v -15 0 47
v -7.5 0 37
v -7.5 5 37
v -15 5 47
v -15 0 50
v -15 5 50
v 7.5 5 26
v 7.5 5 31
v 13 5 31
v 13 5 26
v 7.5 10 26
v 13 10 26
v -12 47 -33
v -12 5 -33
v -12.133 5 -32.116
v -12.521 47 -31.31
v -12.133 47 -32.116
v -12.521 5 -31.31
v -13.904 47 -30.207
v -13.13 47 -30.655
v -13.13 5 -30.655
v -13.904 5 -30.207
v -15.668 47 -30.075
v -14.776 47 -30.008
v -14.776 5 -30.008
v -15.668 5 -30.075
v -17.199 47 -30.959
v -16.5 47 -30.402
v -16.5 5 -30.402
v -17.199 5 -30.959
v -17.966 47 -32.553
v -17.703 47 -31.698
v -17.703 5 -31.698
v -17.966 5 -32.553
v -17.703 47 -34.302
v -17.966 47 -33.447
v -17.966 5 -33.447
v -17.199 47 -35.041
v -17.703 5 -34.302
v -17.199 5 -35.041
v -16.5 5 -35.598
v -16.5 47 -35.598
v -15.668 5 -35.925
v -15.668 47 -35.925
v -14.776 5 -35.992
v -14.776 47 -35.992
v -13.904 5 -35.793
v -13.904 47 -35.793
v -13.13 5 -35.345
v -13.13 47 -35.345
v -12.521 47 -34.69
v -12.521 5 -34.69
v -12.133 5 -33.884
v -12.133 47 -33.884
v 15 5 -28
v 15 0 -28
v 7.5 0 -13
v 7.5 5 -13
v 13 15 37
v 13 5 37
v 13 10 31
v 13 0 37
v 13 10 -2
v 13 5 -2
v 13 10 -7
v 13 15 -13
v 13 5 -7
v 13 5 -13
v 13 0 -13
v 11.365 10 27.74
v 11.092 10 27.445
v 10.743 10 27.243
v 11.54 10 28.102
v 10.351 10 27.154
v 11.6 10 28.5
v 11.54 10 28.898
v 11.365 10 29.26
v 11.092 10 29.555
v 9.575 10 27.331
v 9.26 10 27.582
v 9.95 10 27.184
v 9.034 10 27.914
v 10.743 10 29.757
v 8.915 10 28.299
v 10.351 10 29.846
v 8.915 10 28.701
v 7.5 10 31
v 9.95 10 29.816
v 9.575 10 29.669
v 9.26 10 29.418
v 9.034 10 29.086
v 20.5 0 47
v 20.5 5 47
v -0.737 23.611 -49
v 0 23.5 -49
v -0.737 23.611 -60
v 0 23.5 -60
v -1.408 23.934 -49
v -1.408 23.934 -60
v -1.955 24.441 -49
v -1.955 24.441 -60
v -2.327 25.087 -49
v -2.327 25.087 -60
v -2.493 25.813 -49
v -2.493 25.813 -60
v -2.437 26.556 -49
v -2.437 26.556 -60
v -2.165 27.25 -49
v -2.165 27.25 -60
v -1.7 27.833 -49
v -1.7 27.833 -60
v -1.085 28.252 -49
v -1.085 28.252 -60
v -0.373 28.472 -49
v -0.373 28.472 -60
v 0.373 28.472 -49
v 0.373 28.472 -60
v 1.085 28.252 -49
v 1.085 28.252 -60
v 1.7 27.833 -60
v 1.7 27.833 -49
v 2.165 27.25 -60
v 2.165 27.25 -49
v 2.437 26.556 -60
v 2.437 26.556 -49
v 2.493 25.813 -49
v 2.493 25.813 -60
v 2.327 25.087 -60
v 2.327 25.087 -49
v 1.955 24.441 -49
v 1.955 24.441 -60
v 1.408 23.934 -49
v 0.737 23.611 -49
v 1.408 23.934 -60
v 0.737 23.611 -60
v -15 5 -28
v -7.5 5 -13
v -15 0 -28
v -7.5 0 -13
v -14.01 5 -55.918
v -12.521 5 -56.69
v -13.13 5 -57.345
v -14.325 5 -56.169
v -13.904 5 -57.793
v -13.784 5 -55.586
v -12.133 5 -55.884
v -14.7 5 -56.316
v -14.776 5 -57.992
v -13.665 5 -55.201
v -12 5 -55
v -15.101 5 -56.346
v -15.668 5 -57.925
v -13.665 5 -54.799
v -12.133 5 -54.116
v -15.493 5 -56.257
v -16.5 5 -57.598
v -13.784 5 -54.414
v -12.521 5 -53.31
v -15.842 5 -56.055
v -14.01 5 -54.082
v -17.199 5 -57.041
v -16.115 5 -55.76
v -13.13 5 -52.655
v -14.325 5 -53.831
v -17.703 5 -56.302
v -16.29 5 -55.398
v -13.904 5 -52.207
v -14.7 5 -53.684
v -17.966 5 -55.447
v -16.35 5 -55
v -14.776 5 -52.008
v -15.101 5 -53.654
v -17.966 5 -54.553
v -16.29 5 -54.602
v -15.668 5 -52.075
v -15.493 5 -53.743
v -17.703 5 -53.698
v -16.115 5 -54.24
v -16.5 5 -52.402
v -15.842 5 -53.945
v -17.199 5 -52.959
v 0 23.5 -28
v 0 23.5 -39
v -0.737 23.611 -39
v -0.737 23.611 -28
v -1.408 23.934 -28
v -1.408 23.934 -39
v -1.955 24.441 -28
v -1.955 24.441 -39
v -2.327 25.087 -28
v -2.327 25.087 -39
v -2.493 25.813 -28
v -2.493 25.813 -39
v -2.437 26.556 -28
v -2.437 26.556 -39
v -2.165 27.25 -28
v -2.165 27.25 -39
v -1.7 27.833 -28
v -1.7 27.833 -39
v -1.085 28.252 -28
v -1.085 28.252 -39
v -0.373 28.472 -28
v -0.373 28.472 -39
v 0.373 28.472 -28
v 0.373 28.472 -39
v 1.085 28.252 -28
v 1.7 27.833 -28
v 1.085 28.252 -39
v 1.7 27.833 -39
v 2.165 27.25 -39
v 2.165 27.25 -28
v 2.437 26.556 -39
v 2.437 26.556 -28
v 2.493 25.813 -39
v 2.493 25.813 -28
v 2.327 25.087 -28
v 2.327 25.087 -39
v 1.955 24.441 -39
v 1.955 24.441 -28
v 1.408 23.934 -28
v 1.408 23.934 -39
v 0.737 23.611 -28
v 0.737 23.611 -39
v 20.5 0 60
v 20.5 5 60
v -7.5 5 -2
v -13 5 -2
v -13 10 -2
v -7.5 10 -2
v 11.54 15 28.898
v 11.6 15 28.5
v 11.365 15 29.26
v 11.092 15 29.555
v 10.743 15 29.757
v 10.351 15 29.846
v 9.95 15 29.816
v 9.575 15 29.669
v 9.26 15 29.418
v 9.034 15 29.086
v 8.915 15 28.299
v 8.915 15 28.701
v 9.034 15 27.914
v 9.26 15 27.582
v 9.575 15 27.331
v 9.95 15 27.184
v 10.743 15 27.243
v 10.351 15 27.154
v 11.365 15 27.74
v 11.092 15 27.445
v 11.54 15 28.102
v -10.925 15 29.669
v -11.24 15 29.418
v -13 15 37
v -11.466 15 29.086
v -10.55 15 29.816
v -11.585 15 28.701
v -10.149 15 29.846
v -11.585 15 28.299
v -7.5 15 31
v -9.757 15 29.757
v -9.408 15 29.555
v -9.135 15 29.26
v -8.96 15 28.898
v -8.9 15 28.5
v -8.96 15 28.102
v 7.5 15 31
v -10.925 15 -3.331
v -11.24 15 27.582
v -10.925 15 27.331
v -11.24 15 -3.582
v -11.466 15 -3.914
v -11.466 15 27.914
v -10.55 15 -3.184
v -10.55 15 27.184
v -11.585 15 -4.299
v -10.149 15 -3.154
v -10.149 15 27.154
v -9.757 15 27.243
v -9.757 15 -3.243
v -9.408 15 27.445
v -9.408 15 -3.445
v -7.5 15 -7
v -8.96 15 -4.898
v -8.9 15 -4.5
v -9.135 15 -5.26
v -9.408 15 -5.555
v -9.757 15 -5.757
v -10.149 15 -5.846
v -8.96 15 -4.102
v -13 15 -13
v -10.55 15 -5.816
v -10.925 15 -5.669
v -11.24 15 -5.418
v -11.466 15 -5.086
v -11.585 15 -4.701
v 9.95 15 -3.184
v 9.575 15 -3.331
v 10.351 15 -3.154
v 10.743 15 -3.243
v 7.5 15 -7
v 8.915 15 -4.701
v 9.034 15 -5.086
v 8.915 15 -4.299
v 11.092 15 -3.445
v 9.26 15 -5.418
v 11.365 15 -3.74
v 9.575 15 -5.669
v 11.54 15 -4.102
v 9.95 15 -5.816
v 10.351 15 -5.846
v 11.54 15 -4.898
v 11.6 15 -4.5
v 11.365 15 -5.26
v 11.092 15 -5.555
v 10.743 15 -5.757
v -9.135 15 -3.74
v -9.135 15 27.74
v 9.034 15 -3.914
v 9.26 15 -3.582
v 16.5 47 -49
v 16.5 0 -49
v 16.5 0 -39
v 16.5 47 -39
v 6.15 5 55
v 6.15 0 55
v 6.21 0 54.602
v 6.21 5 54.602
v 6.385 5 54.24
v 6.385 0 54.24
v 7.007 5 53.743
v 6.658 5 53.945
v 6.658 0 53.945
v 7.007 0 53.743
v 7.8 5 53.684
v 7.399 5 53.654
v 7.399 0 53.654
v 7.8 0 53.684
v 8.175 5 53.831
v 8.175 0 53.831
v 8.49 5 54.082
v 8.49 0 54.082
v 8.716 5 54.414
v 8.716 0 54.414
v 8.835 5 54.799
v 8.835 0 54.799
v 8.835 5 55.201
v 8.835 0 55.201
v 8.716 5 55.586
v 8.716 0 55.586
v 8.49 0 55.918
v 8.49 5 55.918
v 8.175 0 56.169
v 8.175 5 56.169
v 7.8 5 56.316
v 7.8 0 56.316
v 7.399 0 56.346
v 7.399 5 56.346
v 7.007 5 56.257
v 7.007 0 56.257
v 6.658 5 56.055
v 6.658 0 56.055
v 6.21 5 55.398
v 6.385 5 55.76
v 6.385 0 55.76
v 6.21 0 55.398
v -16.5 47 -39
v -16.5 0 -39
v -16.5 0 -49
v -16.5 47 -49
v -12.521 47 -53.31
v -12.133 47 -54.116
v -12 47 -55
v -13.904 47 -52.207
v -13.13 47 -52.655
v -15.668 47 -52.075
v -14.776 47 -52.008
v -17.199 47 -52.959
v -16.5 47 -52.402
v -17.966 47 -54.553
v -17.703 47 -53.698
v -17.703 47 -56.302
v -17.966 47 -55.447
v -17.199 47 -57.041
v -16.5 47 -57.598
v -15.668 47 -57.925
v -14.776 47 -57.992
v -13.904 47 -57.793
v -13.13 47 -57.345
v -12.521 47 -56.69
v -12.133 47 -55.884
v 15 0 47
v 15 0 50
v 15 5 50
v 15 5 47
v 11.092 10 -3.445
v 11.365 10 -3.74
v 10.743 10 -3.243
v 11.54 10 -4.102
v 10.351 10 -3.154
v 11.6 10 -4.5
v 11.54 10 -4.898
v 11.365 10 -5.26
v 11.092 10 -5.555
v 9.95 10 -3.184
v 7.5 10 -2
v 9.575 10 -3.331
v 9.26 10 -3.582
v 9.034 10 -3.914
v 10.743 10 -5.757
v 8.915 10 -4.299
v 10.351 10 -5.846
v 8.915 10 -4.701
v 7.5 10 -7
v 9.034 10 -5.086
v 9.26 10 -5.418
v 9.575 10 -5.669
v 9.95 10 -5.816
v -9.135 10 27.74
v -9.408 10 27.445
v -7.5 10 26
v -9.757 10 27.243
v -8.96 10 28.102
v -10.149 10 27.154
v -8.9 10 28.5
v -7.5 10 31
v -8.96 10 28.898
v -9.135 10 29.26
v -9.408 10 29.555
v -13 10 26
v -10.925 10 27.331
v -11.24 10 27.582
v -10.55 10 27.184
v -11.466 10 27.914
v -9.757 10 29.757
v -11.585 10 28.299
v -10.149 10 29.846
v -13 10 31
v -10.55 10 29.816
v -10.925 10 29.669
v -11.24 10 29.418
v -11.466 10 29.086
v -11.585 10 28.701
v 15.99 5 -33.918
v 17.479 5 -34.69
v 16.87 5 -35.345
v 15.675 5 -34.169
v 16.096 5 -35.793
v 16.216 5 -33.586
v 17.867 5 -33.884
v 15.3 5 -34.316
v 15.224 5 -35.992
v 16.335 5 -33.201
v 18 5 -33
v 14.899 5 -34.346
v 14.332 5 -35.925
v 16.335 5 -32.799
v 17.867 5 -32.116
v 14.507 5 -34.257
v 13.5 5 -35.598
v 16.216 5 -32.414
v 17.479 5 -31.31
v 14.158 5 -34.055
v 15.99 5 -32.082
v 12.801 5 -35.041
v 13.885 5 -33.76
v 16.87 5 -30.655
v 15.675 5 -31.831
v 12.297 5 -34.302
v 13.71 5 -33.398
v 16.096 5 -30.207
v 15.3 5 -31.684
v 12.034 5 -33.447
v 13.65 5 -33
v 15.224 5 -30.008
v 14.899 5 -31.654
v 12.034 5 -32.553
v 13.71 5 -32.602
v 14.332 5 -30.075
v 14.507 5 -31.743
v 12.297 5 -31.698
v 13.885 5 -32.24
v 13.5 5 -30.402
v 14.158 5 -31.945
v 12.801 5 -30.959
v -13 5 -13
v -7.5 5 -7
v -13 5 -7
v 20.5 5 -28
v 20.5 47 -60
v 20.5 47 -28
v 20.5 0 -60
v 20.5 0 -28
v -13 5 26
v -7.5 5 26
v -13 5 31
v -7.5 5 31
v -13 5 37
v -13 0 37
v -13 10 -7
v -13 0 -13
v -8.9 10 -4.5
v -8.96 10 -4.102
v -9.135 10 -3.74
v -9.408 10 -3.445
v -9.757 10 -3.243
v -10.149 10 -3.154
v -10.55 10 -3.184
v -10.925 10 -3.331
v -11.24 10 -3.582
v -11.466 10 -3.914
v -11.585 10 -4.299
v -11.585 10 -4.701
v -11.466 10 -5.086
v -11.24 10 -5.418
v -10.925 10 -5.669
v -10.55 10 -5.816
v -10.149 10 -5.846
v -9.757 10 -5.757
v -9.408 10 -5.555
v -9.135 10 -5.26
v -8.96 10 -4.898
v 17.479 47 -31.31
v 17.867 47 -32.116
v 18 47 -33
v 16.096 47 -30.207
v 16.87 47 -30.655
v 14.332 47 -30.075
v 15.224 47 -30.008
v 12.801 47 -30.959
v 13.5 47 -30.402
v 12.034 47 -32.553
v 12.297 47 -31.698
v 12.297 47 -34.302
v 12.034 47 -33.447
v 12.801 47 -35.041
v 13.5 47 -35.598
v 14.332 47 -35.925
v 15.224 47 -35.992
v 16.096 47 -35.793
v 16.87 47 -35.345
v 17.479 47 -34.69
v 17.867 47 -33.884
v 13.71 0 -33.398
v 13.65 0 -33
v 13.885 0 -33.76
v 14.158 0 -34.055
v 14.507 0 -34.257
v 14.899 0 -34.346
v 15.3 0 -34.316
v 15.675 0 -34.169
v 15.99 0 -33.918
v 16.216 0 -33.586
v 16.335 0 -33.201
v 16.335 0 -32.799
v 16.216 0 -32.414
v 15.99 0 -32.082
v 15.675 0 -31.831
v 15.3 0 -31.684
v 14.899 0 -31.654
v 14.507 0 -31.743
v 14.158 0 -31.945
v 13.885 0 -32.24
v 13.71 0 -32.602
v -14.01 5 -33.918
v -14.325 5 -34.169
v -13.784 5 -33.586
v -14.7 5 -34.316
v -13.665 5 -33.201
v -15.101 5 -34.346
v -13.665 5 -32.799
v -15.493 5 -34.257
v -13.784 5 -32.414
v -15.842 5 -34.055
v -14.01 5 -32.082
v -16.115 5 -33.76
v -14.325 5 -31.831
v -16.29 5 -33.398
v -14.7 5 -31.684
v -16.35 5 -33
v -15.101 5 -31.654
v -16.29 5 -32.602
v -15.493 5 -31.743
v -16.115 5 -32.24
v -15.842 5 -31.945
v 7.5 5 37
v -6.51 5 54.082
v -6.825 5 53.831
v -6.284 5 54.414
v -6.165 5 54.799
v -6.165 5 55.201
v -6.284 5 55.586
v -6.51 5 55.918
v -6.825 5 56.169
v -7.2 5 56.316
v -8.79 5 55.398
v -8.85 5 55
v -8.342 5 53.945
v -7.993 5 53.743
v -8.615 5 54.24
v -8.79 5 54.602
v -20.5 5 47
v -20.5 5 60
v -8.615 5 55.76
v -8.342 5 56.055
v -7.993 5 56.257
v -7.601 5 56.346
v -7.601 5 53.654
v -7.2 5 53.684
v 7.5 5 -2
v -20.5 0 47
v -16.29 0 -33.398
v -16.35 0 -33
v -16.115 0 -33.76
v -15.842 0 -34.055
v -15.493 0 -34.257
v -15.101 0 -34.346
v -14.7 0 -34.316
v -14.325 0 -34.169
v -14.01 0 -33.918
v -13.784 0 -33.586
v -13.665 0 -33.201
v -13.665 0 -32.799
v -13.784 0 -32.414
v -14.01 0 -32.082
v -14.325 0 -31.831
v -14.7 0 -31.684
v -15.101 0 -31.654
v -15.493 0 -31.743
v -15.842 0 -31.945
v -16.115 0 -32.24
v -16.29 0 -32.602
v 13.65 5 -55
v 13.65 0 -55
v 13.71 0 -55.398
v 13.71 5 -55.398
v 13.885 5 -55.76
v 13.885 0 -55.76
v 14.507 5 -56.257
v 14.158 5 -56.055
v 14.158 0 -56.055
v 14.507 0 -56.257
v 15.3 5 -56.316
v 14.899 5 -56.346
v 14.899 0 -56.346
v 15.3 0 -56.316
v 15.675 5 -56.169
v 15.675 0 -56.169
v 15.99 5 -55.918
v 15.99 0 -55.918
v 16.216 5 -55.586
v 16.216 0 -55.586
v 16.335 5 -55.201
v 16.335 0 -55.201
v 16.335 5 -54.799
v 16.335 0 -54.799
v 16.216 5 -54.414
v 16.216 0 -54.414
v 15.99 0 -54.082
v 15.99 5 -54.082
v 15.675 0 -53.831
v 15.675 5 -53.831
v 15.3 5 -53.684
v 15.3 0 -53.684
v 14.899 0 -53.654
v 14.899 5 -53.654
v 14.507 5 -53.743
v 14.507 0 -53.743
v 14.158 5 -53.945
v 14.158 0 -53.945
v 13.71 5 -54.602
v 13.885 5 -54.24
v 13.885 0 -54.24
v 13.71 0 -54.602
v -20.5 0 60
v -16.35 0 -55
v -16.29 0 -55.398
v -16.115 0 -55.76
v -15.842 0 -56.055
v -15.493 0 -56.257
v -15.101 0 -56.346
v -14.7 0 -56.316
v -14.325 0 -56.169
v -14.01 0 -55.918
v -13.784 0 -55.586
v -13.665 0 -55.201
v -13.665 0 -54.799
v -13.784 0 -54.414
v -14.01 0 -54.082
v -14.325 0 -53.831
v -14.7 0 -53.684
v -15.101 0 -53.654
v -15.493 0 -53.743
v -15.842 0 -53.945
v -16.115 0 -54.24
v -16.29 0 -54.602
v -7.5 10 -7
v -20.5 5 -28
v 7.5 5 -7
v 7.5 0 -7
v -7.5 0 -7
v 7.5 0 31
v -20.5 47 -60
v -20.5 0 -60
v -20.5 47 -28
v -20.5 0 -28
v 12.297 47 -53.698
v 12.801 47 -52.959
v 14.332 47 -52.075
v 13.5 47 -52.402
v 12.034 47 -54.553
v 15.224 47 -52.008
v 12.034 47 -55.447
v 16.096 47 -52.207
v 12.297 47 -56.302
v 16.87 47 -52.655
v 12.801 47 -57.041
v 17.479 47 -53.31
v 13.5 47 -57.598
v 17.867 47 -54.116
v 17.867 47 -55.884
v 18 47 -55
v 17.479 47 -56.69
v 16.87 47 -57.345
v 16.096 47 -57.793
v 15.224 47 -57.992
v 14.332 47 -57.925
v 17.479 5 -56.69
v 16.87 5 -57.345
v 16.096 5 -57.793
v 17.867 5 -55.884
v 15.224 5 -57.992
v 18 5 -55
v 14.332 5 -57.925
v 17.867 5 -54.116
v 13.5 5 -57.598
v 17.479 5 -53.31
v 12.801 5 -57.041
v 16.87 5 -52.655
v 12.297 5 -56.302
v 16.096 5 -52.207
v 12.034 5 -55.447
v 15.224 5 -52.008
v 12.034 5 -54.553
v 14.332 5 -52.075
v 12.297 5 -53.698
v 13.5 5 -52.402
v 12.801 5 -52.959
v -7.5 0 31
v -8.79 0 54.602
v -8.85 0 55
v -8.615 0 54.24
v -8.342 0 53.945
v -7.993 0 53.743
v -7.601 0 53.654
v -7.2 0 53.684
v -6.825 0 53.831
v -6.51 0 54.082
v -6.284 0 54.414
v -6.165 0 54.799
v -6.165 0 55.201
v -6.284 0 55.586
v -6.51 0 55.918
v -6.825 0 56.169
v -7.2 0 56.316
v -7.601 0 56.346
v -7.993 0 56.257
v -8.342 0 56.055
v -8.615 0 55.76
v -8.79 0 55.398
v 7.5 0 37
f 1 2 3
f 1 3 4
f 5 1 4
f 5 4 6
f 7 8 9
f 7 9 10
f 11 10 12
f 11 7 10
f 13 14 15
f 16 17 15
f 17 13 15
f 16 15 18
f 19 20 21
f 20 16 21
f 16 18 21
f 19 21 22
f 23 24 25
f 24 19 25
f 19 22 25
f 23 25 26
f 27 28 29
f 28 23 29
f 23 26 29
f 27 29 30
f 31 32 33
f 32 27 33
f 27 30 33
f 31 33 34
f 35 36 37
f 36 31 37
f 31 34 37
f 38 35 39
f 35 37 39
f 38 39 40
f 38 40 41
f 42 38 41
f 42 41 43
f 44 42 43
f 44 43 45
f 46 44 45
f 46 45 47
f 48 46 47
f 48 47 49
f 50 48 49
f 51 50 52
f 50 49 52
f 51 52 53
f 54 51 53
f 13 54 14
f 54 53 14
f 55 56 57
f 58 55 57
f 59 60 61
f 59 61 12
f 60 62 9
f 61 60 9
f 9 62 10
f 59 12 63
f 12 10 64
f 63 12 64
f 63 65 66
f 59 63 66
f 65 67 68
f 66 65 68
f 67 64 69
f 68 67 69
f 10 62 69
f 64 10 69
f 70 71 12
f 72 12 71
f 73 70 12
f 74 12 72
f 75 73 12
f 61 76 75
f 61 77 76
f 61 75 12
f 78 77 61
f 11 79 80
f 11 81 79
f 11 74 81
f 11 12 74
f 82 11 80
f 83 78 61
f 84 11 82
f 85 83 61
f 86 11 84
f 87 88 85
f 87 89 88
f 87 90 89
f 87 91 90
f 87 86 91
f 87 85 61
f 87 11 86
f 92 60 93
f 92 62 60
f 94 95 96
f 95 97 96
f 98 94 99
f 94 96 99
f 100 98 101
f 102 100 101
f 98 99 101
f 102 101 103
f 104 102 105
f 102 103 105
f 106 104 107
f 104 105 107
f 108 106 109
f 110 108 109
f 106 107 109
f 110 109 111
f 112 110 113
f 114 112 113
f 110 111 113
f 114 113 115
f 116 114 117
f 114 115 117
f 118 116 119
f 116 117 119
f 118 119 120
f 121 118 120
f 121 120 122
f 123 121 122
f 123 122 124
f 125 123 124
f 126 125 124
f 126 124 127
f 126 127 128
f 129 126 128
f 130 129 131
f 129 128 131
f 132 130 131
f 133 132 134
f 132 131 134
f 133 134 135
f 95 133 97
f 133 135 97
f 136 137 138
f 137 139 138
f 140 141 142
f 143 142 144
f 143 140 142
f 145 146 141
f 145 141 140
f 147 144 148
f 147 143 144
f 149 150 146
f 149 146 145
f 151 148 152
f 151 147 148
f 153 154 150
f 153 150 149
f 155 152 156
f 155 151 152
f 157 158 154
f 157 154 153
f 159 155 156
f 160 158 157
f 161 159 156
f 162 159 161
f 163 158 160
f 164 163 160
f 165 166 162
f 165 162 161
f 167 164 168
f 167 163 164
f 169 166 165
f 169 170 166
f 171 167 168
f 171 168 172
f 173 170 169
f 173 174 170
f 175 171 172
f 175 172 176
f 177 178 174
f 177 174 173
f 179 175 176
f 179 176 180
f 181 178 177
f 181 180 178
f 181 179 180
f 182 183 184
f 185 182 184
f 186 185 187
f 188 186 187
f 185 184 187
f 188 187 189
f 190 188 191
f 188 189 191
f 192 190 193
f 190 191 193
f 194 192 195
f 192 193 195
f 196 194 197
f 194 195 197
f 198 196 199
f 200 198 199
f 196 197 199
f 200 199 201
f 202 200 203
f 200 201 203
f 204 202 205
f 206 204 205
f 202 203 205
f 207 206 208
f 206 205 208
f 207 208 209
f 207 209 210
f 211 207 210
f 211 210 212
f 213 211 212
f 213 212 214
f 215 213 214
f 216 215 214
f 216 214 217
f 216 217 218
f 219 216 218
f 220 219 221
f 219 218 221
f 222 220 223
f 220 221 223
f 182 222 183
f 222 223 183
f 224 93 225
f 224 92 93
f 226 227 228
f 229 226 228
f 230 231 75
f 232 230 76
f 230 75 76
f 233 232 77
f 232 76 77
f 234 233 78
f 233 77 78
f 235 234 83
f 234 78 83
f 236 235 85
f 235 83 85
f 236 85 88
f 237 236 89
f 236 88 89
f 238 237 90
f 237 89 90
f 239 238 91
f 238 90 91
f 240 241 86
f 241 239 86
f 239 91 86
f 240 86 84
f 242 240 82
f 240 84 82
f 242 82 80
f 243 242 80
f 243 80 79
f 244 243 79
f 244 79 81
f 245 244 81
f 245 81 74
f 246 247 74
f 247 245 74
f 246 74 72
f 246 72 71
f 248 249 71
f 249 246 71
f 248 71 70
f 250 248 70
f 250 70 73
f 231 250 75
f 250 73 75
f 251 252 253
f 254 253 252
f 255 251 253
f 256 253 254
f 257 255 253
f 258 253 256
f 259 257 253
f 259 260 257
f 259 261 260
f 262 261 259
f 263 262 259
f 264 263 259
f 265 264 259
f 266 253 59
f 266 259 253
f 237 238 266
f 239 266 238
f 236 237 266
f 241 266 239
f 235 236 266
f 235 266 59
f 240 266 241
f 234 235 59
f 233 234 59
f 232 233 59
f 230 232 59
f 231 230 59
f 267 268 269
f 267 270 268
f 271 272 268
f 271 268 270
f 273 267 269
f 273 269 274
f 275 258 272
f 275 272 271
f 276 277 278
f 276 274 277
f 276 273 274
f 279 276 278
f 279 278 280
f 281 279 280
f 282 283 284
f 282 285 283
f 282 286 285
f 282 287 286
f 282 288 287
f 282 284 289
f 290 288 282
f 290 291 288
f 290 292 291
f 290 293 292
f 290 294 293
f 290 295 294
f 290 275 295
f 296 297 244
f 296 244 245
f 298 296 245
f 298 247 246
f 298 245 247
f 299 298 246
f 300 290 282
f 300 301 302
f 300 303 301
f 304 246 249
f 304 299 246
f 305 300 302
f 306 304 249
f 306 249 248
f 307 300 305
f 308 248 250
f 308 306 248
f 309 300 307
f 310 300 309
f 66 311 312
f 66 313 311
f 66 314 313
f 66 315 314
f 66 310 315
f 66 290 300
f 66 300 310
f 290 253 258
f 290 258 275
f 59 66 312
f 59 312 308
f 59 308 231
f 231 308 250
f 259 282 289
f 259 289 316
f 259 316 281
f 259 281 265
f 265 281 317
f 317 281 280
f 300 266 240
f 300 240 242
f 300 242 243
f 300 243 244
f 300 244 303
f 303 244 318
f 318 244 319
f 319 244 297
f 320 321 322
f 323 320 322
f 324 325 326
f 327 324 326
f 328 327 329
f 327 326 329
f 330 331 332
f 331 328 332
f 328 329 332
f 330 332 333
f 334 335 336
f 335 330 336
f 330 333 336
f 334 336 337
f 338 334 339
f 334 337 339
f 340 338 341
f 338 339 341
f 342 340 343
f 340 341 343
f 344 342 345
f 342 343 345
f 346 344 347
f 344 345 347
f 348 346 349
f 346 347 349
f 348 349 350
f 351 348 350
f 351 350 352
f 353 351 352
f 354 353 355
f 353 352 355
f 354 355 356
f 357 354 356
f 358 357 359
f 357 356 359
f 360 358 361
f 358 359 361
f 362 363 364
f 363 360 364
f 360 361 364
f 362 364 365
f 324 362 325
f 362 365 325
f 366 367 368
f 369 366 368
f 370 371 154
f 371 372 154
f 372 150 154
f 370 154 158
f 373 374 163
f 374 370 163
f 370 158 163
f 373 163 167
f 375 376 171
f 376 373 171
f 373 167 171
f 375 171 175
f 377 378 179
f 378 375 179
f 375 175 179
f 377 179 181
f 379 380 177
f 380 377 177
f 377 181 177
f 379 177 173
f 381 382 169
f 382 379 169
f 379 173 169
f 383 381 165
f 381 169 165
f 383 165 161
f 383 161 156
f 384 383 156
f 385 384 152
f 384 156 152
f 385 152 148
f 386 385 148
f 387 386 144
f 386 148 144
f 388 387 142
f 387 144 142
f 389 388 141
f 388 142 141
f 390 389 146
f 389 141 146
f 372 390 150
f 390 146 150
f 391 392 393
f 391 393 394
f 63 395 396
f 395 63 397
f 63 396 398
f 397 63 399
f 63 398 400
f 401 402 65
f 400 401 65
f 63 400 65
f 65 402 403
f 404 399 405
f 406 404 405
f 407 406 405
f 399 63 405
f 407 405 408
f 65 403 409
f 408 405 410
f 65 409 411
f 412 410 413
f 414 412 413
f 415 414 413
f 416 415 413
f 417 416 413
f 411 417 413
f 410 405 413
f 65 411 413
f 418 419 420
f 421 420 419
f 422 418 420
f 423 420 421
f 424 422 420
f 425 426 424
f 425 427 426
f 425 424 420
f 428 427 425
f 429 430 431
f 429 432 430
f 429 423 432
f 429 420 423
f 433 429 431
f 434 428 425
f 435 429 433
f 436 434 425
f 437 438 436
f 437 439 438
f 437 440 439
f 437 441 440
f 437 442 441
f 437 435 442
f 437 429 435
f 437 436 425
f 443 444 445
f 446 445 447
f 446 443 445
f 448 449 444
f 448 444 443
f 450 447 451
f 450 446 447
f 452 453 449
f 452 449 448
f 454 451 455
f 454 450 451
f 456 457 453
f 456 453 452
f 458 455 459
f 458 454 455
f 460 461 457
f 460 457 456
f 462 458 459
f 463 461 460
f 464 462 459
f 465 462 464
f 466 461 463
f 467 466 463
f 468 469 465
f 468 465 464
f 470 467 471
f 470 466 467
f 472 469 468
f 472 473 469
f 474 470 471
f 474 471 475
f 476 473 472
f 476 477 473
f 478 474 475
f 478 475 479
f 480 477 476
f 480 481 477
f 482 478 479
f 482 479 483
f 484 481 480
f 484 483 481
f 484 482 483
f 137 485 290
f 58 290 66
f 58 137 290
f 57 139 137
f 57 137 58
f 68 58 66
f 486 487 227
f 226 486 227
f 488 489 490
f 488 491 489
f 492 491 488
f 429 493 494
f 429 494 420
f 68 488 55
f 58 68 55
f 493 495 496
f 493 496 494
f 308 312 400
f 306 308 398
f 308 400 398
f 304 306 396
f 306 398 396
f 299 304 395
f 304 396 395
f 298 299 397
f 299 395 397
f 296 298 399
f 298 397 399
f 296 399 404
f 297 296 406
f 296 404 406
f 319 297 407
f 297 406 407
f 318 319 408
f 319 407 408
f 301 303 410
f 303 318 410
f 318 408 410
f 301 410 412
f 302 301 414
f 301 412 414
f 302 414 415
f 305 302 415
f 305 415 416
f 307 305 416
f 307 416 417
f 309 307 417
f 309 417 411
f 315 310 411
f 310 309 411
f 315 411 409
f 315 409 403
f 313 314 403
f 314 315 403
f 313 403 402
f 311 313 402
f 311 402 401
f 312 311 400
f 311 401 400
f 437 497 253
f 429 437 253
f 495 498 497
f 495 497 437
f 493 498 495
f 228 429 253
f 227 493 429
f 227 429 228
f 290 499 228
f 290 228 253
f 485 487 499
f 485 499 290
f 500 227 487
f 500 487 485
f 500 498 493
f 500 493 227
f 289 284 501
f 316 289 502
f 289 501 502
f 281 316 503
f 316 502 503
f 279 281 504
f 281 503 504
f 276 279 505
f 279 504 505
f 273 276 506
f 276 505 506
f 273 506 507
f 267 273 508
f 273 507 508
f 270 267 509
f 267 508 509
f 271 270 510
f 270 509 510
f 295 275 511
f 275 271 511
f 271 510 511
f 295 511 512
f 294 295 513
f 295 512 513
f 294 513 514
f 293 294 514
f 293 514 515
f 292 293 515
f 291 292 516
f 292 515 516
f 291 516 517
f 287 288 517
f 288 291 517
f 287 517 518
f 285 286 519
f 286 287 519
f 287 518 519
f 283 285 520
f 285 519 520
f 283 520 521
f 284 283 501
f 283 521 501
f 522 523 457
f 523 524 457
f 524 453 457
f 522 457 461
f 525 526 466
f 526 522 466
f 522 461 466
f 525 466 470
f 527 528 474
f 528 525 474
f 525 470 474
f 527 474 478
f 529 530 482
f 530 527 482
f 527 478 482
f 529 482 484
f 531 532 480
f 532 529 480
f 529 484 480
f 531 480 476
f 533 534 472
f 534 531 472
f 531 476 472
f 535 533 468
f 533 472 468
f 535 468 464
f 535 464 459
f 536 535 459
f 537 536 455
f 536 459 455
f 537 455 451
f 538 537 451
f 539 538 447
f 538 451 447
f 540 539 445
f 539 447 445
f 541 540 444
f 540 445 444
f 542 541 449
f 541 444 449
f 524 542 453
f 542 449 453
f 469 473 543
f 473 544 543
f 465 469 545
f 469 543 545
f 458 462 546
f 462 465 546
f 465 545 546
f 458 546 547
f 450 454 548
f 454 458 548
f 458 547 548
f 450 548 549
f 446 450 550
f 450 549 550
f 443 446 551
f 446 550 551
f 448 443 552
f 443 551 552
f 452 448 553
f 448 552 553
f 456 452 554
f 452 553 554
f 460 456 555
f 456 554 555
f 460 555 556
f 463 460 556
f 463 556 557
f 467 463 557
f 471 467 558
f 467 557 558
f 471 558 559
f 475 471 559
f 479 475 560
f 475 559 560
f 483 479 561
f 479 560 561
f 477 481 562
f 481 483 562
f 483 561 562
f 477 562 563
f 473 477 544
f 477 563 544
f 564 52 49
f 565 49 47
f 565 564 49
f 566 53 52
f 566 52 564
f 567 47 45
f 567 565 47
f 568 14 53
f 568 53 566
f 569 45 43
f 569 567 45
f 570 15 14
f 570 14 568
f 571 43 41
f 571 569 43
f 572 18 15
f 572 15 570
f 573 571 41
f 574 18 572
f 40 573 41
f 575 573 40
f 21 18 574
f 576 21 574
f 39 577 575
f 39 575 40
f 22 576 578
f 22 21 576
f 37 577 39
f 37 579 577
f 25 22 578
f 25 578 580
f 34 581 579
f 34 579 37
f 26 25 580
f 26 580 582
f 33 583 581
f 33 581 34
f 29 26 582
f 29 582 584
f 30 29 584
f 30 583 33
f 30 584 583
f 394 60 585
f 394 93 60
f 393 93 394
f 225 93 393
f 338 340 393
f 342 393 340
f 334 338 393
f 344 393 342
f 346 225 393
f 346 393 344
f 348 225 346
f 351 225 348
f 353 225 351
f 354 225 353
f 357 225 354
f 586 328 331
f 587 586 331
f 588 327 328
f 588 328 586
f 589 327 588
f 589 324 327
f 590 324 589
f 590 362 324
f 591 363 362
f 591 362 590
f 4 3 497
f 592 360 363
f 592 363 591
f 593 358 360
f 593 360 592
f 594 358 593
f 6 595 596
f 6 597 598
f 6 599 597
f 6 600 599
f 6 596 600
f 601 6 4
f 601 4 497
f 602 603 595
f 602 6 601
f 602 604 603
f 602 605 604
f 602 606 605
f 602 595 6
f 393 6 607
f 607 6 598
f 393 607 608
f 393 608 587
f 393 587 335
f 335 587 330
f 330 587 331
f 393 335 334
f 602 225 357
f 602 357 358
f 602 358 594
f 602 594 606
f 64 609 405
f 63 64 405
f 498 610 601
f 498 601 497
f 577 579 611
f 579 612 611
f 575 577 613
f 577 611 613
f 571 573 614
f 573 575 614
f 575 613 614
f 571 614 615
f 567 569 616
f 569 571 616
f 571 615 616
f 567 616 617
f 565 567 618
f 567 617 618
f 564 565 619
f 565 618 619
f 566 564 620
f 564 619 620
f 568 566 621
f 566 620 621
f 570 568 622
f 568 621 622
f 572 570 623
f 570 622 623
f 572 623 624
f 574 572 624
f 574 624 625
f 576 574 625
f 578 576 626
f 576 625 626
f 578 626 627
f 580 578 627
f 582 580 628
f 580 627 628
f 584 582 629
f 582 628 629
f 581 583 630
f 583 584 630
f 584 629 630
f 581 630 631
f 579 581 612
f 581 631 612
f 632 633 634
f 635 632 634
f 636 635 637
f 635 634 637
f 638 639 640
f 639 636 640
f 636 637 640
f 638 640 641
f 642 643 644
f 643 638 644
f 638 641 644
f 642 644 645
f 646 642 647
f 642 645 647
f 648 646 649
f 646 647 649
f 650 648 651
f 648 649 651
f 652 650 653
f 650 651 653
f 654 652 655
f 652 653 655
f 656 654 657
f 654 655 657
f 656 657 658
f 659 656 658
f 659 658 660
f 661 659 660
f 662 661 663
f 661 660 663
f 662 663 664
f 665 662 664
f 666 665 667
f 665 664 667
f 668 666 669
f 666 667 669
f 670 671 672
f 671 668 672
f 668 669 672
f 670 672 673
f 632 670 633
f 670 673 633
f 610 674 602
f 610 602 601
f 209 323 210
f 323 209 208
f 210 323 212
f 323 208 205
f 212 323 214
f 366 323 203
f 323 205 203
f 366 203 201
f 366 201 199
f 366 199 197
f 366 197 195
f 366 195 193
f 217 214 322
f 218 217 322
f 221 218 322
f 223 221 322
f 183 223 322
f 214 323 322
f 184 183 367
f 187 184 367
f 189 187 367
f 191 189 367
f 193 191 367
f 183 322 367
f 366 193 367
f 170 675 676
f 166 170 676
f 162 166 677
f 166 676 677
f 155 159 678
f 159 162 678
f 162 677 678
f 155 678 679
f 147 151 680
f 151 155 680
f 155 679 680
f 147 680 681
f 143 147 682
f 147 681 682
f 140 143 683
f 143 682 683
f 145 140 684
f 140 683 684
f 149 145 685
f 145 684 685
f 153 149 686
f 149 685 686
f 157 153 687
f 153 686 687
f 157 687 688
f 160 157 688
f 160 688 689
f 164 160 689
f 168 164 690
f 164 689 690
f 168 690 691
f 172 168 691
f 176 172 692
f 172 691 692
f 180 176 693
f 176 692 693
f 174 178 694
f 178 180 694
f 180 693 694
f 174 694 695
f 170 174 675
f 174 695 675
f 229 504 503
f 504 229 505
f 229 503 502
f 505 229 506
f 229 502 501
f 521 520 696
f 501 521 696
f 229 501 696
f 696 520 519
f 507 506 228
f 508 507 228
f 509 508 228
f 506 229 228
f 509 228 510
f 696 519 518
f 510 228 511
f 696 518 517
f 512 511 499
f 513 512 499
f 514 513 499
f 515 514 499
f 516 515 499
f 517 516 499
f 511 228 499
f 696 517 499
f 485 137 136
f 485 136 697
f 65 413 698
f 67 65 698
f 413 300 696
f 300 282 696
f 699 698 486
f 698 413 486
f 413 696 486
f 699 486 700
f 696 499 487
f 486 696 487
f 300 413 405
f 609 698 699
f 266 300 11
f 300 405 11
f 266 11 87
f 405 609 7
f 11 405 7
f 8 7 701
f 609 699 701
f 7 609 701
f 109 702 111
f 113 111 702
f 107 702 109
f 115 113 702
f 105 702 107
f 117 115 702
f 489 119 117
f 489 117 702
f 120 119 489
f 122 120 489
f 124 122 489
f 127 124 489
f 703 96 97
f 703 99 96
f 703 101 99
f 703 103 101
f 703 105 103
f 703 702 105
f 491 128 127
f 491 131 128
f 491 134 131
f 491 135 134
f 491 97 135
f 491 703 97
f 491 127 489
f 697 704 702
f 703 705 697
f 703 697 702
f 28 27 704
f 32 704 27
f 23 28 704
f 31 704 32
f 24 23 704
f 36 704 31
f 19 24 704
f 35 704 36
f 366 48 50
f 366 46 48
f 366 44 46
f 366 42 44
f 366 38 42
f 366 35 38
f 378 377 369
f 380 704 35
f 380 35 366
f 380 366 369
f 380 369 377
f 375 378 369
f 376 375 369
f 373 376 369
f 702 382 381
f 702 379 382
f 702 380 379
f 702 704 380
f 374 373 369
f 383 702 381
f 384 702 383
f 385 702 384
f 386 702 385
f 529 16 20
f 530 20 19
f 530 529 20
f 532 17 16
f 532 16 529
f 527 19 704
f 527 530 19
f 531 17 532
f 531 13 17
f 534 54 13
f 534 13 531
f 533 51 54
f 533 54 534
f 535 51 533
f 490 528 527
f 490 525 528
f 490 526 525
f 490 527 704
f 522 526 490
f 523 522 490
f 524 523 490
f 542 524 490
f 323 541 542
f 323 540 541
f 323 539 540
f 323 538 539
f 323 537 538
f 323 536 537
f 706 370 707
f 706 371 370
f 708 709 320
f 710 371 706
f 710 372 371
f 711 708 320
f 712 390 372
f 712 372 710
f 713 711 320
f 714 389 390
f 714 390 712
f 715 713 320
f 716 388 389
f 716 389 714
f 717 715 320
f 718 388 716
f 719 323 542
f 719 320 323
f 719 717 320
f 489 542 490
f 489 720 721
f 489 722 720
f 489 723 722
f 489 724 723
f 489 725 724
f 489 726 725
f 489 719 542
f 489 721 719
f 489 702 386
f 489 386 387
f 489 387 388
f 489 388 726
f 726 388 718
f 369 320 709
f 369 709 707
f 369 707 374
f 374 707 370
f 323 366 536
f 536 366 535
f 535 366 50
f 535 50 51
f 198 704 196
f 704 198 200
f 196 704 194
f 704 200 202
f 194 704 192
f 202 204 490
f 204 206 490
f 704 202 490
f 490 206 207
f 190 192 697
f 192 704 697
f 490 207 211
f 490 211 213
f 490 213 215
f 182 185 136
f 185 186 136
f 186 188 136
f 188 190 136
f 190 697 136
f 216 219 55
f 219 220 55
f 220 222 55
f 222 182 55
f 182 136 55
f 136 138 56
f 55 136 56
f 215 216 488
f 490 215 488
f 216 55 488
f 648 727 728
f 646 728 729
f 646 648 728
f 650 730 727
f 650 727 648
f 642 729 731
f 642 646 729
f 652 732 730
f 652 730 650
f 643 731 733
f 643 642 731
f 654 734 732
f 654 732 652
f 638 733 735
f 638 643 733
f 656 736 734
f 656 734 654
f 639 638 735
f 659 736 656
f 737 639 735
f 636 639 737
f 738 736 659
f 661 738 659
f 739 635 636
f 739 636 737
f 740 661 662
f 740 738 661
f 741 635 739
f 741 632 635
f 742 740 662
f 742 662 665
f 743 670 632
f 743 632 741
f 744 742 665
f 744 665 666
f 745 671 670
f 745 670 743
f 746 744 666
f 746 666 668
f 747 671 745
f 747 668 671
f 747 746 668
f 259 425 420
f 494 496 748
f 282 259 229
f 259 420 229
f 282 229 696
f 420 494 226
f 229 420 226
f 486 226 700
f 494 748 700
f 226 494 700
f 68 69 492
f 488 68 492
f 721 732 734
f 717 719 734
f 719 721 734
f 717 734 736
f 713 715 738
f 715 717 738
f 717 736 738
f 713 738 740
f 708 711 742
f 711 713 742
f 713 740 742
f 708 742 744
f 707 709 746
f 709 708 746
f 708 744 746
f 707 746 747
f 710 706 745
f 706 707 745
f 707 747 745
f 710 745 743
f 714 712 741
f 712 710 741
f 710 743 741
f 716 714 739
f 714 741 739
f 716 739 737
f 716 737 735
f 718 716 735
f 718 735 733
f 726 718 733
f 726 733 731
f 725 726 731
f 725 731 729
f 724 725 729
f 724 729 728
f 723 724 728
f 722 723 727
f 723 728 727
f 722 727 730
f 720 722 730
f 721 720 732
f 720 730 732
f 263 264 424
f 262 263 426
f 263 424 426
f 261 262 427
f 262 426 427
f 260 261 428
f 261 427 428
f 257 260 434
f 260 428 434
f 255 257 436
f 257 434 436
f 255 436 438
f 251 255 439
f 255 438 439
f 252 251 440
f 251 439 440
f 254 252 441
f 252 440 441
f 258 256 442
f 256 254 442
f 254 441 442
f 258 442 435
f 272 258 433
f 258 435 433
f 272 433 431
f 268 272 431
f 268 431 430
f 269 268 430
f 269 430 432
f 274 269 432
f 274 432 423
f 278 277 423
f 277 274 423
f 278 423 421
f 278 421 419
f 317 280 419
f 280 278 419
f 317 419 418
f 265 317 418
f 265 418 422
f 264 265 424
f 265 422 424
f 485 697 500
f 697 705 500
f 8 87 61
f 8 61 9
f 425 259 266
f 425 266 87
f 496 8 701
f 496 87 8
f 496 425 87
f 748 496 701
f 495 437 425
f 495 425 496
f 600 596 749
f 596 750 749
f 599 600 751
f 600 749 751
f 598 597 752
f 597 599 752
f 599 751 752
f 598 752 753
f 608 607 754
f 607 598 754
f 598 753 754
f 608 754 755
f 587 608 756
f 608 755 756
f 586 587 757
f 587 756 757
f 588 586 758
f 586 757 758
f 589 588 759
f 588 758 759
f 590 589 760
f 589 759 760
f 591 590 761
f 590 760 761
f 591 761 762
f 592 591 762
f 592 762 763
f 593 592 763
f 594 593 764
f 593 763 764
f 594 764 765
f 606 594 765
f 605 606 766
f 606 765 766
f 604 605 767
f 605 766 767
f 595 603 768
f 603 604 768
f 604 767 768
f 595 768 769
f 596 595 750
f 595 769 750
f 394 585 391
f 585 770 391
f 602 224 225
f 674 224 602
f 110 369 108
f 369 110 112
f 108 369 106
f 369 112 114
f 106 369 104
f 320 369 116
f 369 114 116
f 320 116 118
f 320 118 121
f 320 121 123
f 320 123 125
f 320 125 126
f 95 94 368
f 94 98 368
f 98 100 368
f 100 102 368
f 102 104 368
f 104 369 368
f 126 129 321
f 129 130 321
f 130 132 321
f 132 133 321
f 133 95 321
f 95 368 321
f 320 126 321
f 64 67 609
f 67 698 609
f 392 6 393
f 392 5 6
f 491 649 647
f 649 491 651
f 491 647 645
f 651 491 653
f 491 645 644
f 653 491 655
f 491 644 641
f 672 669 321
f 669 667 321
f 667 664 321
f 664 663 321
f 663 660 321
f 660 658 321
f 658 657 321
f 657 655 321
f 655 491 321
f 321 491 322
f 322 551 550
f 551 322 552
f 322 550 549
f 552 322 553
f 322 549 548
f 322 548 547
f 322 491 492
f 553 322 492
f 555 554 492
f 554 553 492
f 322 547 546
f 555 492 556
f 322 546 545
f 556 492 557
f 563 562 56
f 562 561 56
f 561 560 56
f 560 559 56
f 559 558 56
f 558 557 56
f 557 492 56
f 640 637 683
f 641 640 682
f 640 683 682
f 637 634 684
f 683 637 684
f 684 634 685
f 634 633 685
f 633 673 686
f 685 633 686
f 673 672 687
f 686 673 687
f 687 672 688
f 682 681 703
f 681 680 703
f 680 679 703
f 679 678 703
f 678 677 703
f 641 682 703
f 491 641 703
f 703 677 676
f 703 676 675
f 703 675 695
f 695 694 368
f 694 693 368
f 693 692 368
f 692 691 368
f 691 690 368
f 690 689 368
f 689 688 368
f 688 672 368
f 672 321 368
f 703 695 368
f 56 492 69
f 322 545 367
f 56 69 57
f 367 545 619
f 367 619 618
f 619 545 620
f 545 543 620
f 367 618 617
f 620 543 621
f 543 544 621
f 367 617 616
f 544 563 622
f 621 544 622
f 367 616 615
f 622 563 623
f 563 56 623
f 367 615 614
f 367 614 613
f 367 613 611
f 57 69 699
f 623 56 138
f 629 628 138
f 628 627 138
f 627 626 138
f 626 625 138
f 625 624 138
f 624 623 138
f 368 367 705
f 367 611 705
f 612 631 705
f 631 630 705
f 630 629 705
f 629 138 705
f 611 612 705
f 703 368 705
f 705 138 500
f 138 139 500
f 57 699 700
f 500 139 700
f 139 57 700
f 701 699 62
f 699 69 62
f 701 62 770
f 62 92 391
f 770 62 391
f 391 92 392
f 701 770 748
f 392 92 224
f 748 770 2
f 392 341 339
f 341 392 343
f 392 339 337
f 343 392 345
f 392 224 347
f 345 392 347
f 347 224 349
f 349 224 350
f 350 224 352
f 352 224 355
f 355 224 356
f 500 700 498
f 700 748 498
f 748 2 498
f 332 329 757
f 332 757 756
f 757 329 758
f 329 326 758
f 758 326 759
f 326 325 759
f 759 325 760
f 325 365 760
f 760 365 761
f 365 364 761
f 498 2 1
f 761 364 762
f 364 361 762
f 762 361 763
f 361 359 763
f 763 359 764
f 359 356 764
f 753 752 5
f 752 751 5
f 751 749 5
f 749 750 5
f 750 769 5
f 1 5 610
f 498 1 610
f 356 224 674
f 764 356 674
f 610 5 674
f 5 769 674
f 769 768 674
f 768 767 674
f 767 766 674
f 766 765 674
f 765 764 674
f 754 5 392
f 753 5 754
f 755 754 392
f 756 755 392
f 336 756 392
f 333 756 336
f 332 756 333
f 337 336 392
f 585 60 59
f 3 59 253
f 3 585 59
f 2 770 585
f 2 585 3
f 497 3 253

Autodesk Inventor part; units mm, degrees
ref_plane "YZ Plane" through (0, 0, 0) normal (1, 0, 0) x (0, 1, 0)
ref_plane "XZ Plane" through (0, 0, 0) normal (0, 1, 0) x (-1, 0, 0)
ref_plane "XY Plane" through (0, 0, 0) normal (0, 0, 1) x (1, 0, 0)
sketch "Sketch1" plane through (0, 0, 0) normal (0, 1, 0) x (-1, 0, 0)
  line L0 (20.5, -60) -> (-20.5, -60)
  line L1 (-20.5, -60) -> (-20.5, 60)
  line L2 (-20.5, 60) -> (20.5, 60)
  line L3 (20.5, -60) -> (-20.5, 60) construction
  line L4 (-20.5, -60) -> (20.5, 60) construction
  circle A0 centre (7.5, 55) radius 1.35
  circle A1 centre (-7.5, 55) radius 1.35
  circle A2 centre (15, -33) radius 1.35
  circle A3 centre (15, -55) radius 1.35
  circle A4 centre (-15, -55) radius 1.35
  circle A5 centre (-15, -33) radius 1.35
  line L5 (-13, -13) -> (-13, 37)
  line L6 (13, 37) -> (13, -13)
  line L7 (20.5, -33) -> (20.5, -28)
  line L8 (20.5, -28) -> (13, -13)
  line L9 (-13, -13) -> (-20.5, -28)
  line L10 (20.5, 55) -> (20.5, 54)
  line L11 (20.5, 47) -> (13, 37)
  line L12 (-13, 37) -> (-20.5, 47)
  line L13 (20.5, 60) -> (20.5, 47)
  line L14 (20.5, -28) -> (20.5, -60)
  line L15 (16.5, -49) -> (-16.5, -49)
  line L16 (-16.5, -49) -> (-16.5, -39)
  line L17 (-16.5, -39) -> (16.5, -39)
  line L18 (16.5, -39) -> (16.5, -49)
  line L19 (15, -28) -> (-15, -28)
  line L20 (-15, -28) -> (-7.5, -13)
  line L21 (-7.5, -13) -> (7.5, -13)
  line L22 (7.5, -13) -> (15, -28)
  line L23 (7.5, -7) -> (-7.5, -7)
  line L24 (-7.5, -7) -> (-7.5, 31)
  line L25 (-7.5, 31) -> (7.5, 31)
  line L26 (7.5, 31) -> (7.5, -7)
  line L27 (7.5, 37) -> (-7.5, 37)
  line L28 (-7.5, 37) -> (-15, 47)
  line L29 (7.5, 37) -> (15, 47)
  line L30 (15, 47) -> (15, 50)
  line L31 (15, 50) -> (-15, 50)
  line L32 (-15, 50) -> (-15, 47)
  point P0 (0, 0)
  dimension "d0" = 41
  dimension "d1" = 120
  dimension "d2" = 5
  dimension "d3" = 2.7
  dimension "d5" = 22
  dimension "d6" = 15
  dimension "d7" = 7.5
  dimension "d8" = 30
  dimension "d9" = 15
  dimension "d10" = 88
  dimension "d11" = 50
  dimension "d12" = 26
  dimension "d14" = 13
  dimension "d15" = 5
  dimension "d16" = 8
  dimension "d17" = 33
  dimension "d18" = 16.5
  dimension "d19" = 10
  dimension "d20" = 6
  dimension "d21" = 5
  dimension "d22" = 15
  dimension "d23" = 6
  dimension "d25" = 6
  dimension "d28" = 5.5
  dimension "d29" = 5.5
  dimension "d30" = 5
  dimension "d33" = 0
  dimension "d34" = 5.5
  dimension "d35" = 5.5
extrude "Extrusion1" add sketch "Sketch1" along normal blind 5 contours L0 L1 L9 L5 L12 L2 L13 L10 L11 L6 L8 L7 L14
sketch "Sketch2" plane through (0, 5, 0) normal (0, 1, 0) x (1, 0, 0)
  line L0 (-20.5, 60) -> (-20.5, 28) projected
  line L1 (-7.5, 13) -> (-15, 28) projected
  line L2 (-20.5, 28) -> (-15, 28)
  line L3 (15, 28) -> (7.5, 13) projected
  line L4 (13, 13) -> (20.5, 28) projected
  line L5 (15, 28) -> (20.5, 28)
  line L6 (20.5, 60) -> (-20.5, 60) projected
  line L7 (20.5, 28) -> (20.5, 60) projected
  line L8 (16.5, 39) -> (-16.5, 39) projected
  line L9 (-15, 28) -> (15, 28) projected
  circle A0 centre (-15, 33) radius 1.35 projected
  circle A1 centre (15, 33) radius 1.35 projected
  line L10 (-16.5, 49) -> (16.5, 49) projected
  line L11 (-16.5, 39) -> (-16.5, 49) projected
  line L12 (16.5, 49) -> (16.5, 39) projected
  circle A2 centre (15, 55) radius 1.35 projected
  circle A3 centre (-15, 55) radius 1.35 projected
  circle A4 centre (-15, 55) radius 3
  circle A5 centre (15, 55) radius 3
  circle A6 centre (15, 33) radius 3
  circle A7 centre (-15, 33) radius 3
  point P0 (0, 0)
  dimension "d36" = 6
  dimension "d37" = 6
  dimension "d38" = 6
  dimension "d39" = 6
extrude "Extrusion2" add sketch "Sketch2" along normal blind 42 contours L6 L7 L5 L9 L2 L0
sketch "Sketch3" plane through (-15, 0, -28) normal (0, 0, 1) x (1, 0, 0)
  line L0 (-5.5, 5) -> (-5.5, 47) projected
  line L1 (-5.5, 47) -> (35.5, 47) projected
  point P0 (15, 0)
  point P1 (15, 26)
  dimension "d42" = 20.5
  dimension "d43" = 21
hole "Hole1" at (0, 26, -28) direction (0, 0, -1) diameter 5 end through all
sketch "Sketch4" plane through (0, 5, 0) normal (0, 1, 0) x (1, 0, 0)
  line L0 (-7.5, -31) -> (-7.5, 7) projected
  line L1 (7.5, 7) -> (7.5, -31) projected
  line L2 (-7.5, 7) -> (7.5, 7) projected
  line L3 (7.5, -31) -> (-7.5, -31) projected
  line L4 (13, -37) -> (13, 13) projected
  line L5 (-13, 13) -> (13, 13)
  line L6 (13, 13) -> (13, -37)
  line L7 (13, -37) -> (-13, -37)
  line L8 (-13, -37) -> (-13, 13)
  circle A0 centre (-10.25, 4.5) radius 1.35
  circle A1 centre (-10.25, -28.5) radius 1.35
  circle A2 centre (10.25, -28.5) radius 1.35
  circle A3 centre (10.25, 4.5) radius 1.35
  point P0 (0, 0)
  dimension "d63" = 2.7
  dimension "d64" = 2.5
  dimension "d65" = 2.5
  dimension "d66" = 2.75
  dimension "d67" = 2.75
extrude "Extrusion5" add sketch "Sketch4" along normal blind 10
sketch "Sketch5" plane through (-13, 0, -13) normal (-1, 0, 0) x (0, 0, 1)
  line L0 (0, 0) -> (0, 5) construction
  line L1 (60, 5) -> (50, 5) construction
  line L2 (6, 5) -> (11, 5)
  line L3 (11, 5) -> (11, 10)
  line L4 (11, 10) -> (6, 10)
  line L5 (6, 10) -> (6, 5)
  line L6 (44, 5) -> (39, 5)
  line L7 (39, 5) -> (39, 10)
  line L8 (39, 10) -> (44, 10)
  line L9 (44, 10) -> (44, 5)
  point P0 (13, 0)
  dimension "d53" = 5
  dimension "d54" = 5
  dimension "d55" = 0
  dimension "d56" = 5
  dimension "d57" = 5
  dimension "d58" = 6
  dimension "d59" = 6
  dimension "d60" = 5
extrude "Extrusion4" cut sketch "Sketch5" against normal through all
properties part number "Houder encodere"
